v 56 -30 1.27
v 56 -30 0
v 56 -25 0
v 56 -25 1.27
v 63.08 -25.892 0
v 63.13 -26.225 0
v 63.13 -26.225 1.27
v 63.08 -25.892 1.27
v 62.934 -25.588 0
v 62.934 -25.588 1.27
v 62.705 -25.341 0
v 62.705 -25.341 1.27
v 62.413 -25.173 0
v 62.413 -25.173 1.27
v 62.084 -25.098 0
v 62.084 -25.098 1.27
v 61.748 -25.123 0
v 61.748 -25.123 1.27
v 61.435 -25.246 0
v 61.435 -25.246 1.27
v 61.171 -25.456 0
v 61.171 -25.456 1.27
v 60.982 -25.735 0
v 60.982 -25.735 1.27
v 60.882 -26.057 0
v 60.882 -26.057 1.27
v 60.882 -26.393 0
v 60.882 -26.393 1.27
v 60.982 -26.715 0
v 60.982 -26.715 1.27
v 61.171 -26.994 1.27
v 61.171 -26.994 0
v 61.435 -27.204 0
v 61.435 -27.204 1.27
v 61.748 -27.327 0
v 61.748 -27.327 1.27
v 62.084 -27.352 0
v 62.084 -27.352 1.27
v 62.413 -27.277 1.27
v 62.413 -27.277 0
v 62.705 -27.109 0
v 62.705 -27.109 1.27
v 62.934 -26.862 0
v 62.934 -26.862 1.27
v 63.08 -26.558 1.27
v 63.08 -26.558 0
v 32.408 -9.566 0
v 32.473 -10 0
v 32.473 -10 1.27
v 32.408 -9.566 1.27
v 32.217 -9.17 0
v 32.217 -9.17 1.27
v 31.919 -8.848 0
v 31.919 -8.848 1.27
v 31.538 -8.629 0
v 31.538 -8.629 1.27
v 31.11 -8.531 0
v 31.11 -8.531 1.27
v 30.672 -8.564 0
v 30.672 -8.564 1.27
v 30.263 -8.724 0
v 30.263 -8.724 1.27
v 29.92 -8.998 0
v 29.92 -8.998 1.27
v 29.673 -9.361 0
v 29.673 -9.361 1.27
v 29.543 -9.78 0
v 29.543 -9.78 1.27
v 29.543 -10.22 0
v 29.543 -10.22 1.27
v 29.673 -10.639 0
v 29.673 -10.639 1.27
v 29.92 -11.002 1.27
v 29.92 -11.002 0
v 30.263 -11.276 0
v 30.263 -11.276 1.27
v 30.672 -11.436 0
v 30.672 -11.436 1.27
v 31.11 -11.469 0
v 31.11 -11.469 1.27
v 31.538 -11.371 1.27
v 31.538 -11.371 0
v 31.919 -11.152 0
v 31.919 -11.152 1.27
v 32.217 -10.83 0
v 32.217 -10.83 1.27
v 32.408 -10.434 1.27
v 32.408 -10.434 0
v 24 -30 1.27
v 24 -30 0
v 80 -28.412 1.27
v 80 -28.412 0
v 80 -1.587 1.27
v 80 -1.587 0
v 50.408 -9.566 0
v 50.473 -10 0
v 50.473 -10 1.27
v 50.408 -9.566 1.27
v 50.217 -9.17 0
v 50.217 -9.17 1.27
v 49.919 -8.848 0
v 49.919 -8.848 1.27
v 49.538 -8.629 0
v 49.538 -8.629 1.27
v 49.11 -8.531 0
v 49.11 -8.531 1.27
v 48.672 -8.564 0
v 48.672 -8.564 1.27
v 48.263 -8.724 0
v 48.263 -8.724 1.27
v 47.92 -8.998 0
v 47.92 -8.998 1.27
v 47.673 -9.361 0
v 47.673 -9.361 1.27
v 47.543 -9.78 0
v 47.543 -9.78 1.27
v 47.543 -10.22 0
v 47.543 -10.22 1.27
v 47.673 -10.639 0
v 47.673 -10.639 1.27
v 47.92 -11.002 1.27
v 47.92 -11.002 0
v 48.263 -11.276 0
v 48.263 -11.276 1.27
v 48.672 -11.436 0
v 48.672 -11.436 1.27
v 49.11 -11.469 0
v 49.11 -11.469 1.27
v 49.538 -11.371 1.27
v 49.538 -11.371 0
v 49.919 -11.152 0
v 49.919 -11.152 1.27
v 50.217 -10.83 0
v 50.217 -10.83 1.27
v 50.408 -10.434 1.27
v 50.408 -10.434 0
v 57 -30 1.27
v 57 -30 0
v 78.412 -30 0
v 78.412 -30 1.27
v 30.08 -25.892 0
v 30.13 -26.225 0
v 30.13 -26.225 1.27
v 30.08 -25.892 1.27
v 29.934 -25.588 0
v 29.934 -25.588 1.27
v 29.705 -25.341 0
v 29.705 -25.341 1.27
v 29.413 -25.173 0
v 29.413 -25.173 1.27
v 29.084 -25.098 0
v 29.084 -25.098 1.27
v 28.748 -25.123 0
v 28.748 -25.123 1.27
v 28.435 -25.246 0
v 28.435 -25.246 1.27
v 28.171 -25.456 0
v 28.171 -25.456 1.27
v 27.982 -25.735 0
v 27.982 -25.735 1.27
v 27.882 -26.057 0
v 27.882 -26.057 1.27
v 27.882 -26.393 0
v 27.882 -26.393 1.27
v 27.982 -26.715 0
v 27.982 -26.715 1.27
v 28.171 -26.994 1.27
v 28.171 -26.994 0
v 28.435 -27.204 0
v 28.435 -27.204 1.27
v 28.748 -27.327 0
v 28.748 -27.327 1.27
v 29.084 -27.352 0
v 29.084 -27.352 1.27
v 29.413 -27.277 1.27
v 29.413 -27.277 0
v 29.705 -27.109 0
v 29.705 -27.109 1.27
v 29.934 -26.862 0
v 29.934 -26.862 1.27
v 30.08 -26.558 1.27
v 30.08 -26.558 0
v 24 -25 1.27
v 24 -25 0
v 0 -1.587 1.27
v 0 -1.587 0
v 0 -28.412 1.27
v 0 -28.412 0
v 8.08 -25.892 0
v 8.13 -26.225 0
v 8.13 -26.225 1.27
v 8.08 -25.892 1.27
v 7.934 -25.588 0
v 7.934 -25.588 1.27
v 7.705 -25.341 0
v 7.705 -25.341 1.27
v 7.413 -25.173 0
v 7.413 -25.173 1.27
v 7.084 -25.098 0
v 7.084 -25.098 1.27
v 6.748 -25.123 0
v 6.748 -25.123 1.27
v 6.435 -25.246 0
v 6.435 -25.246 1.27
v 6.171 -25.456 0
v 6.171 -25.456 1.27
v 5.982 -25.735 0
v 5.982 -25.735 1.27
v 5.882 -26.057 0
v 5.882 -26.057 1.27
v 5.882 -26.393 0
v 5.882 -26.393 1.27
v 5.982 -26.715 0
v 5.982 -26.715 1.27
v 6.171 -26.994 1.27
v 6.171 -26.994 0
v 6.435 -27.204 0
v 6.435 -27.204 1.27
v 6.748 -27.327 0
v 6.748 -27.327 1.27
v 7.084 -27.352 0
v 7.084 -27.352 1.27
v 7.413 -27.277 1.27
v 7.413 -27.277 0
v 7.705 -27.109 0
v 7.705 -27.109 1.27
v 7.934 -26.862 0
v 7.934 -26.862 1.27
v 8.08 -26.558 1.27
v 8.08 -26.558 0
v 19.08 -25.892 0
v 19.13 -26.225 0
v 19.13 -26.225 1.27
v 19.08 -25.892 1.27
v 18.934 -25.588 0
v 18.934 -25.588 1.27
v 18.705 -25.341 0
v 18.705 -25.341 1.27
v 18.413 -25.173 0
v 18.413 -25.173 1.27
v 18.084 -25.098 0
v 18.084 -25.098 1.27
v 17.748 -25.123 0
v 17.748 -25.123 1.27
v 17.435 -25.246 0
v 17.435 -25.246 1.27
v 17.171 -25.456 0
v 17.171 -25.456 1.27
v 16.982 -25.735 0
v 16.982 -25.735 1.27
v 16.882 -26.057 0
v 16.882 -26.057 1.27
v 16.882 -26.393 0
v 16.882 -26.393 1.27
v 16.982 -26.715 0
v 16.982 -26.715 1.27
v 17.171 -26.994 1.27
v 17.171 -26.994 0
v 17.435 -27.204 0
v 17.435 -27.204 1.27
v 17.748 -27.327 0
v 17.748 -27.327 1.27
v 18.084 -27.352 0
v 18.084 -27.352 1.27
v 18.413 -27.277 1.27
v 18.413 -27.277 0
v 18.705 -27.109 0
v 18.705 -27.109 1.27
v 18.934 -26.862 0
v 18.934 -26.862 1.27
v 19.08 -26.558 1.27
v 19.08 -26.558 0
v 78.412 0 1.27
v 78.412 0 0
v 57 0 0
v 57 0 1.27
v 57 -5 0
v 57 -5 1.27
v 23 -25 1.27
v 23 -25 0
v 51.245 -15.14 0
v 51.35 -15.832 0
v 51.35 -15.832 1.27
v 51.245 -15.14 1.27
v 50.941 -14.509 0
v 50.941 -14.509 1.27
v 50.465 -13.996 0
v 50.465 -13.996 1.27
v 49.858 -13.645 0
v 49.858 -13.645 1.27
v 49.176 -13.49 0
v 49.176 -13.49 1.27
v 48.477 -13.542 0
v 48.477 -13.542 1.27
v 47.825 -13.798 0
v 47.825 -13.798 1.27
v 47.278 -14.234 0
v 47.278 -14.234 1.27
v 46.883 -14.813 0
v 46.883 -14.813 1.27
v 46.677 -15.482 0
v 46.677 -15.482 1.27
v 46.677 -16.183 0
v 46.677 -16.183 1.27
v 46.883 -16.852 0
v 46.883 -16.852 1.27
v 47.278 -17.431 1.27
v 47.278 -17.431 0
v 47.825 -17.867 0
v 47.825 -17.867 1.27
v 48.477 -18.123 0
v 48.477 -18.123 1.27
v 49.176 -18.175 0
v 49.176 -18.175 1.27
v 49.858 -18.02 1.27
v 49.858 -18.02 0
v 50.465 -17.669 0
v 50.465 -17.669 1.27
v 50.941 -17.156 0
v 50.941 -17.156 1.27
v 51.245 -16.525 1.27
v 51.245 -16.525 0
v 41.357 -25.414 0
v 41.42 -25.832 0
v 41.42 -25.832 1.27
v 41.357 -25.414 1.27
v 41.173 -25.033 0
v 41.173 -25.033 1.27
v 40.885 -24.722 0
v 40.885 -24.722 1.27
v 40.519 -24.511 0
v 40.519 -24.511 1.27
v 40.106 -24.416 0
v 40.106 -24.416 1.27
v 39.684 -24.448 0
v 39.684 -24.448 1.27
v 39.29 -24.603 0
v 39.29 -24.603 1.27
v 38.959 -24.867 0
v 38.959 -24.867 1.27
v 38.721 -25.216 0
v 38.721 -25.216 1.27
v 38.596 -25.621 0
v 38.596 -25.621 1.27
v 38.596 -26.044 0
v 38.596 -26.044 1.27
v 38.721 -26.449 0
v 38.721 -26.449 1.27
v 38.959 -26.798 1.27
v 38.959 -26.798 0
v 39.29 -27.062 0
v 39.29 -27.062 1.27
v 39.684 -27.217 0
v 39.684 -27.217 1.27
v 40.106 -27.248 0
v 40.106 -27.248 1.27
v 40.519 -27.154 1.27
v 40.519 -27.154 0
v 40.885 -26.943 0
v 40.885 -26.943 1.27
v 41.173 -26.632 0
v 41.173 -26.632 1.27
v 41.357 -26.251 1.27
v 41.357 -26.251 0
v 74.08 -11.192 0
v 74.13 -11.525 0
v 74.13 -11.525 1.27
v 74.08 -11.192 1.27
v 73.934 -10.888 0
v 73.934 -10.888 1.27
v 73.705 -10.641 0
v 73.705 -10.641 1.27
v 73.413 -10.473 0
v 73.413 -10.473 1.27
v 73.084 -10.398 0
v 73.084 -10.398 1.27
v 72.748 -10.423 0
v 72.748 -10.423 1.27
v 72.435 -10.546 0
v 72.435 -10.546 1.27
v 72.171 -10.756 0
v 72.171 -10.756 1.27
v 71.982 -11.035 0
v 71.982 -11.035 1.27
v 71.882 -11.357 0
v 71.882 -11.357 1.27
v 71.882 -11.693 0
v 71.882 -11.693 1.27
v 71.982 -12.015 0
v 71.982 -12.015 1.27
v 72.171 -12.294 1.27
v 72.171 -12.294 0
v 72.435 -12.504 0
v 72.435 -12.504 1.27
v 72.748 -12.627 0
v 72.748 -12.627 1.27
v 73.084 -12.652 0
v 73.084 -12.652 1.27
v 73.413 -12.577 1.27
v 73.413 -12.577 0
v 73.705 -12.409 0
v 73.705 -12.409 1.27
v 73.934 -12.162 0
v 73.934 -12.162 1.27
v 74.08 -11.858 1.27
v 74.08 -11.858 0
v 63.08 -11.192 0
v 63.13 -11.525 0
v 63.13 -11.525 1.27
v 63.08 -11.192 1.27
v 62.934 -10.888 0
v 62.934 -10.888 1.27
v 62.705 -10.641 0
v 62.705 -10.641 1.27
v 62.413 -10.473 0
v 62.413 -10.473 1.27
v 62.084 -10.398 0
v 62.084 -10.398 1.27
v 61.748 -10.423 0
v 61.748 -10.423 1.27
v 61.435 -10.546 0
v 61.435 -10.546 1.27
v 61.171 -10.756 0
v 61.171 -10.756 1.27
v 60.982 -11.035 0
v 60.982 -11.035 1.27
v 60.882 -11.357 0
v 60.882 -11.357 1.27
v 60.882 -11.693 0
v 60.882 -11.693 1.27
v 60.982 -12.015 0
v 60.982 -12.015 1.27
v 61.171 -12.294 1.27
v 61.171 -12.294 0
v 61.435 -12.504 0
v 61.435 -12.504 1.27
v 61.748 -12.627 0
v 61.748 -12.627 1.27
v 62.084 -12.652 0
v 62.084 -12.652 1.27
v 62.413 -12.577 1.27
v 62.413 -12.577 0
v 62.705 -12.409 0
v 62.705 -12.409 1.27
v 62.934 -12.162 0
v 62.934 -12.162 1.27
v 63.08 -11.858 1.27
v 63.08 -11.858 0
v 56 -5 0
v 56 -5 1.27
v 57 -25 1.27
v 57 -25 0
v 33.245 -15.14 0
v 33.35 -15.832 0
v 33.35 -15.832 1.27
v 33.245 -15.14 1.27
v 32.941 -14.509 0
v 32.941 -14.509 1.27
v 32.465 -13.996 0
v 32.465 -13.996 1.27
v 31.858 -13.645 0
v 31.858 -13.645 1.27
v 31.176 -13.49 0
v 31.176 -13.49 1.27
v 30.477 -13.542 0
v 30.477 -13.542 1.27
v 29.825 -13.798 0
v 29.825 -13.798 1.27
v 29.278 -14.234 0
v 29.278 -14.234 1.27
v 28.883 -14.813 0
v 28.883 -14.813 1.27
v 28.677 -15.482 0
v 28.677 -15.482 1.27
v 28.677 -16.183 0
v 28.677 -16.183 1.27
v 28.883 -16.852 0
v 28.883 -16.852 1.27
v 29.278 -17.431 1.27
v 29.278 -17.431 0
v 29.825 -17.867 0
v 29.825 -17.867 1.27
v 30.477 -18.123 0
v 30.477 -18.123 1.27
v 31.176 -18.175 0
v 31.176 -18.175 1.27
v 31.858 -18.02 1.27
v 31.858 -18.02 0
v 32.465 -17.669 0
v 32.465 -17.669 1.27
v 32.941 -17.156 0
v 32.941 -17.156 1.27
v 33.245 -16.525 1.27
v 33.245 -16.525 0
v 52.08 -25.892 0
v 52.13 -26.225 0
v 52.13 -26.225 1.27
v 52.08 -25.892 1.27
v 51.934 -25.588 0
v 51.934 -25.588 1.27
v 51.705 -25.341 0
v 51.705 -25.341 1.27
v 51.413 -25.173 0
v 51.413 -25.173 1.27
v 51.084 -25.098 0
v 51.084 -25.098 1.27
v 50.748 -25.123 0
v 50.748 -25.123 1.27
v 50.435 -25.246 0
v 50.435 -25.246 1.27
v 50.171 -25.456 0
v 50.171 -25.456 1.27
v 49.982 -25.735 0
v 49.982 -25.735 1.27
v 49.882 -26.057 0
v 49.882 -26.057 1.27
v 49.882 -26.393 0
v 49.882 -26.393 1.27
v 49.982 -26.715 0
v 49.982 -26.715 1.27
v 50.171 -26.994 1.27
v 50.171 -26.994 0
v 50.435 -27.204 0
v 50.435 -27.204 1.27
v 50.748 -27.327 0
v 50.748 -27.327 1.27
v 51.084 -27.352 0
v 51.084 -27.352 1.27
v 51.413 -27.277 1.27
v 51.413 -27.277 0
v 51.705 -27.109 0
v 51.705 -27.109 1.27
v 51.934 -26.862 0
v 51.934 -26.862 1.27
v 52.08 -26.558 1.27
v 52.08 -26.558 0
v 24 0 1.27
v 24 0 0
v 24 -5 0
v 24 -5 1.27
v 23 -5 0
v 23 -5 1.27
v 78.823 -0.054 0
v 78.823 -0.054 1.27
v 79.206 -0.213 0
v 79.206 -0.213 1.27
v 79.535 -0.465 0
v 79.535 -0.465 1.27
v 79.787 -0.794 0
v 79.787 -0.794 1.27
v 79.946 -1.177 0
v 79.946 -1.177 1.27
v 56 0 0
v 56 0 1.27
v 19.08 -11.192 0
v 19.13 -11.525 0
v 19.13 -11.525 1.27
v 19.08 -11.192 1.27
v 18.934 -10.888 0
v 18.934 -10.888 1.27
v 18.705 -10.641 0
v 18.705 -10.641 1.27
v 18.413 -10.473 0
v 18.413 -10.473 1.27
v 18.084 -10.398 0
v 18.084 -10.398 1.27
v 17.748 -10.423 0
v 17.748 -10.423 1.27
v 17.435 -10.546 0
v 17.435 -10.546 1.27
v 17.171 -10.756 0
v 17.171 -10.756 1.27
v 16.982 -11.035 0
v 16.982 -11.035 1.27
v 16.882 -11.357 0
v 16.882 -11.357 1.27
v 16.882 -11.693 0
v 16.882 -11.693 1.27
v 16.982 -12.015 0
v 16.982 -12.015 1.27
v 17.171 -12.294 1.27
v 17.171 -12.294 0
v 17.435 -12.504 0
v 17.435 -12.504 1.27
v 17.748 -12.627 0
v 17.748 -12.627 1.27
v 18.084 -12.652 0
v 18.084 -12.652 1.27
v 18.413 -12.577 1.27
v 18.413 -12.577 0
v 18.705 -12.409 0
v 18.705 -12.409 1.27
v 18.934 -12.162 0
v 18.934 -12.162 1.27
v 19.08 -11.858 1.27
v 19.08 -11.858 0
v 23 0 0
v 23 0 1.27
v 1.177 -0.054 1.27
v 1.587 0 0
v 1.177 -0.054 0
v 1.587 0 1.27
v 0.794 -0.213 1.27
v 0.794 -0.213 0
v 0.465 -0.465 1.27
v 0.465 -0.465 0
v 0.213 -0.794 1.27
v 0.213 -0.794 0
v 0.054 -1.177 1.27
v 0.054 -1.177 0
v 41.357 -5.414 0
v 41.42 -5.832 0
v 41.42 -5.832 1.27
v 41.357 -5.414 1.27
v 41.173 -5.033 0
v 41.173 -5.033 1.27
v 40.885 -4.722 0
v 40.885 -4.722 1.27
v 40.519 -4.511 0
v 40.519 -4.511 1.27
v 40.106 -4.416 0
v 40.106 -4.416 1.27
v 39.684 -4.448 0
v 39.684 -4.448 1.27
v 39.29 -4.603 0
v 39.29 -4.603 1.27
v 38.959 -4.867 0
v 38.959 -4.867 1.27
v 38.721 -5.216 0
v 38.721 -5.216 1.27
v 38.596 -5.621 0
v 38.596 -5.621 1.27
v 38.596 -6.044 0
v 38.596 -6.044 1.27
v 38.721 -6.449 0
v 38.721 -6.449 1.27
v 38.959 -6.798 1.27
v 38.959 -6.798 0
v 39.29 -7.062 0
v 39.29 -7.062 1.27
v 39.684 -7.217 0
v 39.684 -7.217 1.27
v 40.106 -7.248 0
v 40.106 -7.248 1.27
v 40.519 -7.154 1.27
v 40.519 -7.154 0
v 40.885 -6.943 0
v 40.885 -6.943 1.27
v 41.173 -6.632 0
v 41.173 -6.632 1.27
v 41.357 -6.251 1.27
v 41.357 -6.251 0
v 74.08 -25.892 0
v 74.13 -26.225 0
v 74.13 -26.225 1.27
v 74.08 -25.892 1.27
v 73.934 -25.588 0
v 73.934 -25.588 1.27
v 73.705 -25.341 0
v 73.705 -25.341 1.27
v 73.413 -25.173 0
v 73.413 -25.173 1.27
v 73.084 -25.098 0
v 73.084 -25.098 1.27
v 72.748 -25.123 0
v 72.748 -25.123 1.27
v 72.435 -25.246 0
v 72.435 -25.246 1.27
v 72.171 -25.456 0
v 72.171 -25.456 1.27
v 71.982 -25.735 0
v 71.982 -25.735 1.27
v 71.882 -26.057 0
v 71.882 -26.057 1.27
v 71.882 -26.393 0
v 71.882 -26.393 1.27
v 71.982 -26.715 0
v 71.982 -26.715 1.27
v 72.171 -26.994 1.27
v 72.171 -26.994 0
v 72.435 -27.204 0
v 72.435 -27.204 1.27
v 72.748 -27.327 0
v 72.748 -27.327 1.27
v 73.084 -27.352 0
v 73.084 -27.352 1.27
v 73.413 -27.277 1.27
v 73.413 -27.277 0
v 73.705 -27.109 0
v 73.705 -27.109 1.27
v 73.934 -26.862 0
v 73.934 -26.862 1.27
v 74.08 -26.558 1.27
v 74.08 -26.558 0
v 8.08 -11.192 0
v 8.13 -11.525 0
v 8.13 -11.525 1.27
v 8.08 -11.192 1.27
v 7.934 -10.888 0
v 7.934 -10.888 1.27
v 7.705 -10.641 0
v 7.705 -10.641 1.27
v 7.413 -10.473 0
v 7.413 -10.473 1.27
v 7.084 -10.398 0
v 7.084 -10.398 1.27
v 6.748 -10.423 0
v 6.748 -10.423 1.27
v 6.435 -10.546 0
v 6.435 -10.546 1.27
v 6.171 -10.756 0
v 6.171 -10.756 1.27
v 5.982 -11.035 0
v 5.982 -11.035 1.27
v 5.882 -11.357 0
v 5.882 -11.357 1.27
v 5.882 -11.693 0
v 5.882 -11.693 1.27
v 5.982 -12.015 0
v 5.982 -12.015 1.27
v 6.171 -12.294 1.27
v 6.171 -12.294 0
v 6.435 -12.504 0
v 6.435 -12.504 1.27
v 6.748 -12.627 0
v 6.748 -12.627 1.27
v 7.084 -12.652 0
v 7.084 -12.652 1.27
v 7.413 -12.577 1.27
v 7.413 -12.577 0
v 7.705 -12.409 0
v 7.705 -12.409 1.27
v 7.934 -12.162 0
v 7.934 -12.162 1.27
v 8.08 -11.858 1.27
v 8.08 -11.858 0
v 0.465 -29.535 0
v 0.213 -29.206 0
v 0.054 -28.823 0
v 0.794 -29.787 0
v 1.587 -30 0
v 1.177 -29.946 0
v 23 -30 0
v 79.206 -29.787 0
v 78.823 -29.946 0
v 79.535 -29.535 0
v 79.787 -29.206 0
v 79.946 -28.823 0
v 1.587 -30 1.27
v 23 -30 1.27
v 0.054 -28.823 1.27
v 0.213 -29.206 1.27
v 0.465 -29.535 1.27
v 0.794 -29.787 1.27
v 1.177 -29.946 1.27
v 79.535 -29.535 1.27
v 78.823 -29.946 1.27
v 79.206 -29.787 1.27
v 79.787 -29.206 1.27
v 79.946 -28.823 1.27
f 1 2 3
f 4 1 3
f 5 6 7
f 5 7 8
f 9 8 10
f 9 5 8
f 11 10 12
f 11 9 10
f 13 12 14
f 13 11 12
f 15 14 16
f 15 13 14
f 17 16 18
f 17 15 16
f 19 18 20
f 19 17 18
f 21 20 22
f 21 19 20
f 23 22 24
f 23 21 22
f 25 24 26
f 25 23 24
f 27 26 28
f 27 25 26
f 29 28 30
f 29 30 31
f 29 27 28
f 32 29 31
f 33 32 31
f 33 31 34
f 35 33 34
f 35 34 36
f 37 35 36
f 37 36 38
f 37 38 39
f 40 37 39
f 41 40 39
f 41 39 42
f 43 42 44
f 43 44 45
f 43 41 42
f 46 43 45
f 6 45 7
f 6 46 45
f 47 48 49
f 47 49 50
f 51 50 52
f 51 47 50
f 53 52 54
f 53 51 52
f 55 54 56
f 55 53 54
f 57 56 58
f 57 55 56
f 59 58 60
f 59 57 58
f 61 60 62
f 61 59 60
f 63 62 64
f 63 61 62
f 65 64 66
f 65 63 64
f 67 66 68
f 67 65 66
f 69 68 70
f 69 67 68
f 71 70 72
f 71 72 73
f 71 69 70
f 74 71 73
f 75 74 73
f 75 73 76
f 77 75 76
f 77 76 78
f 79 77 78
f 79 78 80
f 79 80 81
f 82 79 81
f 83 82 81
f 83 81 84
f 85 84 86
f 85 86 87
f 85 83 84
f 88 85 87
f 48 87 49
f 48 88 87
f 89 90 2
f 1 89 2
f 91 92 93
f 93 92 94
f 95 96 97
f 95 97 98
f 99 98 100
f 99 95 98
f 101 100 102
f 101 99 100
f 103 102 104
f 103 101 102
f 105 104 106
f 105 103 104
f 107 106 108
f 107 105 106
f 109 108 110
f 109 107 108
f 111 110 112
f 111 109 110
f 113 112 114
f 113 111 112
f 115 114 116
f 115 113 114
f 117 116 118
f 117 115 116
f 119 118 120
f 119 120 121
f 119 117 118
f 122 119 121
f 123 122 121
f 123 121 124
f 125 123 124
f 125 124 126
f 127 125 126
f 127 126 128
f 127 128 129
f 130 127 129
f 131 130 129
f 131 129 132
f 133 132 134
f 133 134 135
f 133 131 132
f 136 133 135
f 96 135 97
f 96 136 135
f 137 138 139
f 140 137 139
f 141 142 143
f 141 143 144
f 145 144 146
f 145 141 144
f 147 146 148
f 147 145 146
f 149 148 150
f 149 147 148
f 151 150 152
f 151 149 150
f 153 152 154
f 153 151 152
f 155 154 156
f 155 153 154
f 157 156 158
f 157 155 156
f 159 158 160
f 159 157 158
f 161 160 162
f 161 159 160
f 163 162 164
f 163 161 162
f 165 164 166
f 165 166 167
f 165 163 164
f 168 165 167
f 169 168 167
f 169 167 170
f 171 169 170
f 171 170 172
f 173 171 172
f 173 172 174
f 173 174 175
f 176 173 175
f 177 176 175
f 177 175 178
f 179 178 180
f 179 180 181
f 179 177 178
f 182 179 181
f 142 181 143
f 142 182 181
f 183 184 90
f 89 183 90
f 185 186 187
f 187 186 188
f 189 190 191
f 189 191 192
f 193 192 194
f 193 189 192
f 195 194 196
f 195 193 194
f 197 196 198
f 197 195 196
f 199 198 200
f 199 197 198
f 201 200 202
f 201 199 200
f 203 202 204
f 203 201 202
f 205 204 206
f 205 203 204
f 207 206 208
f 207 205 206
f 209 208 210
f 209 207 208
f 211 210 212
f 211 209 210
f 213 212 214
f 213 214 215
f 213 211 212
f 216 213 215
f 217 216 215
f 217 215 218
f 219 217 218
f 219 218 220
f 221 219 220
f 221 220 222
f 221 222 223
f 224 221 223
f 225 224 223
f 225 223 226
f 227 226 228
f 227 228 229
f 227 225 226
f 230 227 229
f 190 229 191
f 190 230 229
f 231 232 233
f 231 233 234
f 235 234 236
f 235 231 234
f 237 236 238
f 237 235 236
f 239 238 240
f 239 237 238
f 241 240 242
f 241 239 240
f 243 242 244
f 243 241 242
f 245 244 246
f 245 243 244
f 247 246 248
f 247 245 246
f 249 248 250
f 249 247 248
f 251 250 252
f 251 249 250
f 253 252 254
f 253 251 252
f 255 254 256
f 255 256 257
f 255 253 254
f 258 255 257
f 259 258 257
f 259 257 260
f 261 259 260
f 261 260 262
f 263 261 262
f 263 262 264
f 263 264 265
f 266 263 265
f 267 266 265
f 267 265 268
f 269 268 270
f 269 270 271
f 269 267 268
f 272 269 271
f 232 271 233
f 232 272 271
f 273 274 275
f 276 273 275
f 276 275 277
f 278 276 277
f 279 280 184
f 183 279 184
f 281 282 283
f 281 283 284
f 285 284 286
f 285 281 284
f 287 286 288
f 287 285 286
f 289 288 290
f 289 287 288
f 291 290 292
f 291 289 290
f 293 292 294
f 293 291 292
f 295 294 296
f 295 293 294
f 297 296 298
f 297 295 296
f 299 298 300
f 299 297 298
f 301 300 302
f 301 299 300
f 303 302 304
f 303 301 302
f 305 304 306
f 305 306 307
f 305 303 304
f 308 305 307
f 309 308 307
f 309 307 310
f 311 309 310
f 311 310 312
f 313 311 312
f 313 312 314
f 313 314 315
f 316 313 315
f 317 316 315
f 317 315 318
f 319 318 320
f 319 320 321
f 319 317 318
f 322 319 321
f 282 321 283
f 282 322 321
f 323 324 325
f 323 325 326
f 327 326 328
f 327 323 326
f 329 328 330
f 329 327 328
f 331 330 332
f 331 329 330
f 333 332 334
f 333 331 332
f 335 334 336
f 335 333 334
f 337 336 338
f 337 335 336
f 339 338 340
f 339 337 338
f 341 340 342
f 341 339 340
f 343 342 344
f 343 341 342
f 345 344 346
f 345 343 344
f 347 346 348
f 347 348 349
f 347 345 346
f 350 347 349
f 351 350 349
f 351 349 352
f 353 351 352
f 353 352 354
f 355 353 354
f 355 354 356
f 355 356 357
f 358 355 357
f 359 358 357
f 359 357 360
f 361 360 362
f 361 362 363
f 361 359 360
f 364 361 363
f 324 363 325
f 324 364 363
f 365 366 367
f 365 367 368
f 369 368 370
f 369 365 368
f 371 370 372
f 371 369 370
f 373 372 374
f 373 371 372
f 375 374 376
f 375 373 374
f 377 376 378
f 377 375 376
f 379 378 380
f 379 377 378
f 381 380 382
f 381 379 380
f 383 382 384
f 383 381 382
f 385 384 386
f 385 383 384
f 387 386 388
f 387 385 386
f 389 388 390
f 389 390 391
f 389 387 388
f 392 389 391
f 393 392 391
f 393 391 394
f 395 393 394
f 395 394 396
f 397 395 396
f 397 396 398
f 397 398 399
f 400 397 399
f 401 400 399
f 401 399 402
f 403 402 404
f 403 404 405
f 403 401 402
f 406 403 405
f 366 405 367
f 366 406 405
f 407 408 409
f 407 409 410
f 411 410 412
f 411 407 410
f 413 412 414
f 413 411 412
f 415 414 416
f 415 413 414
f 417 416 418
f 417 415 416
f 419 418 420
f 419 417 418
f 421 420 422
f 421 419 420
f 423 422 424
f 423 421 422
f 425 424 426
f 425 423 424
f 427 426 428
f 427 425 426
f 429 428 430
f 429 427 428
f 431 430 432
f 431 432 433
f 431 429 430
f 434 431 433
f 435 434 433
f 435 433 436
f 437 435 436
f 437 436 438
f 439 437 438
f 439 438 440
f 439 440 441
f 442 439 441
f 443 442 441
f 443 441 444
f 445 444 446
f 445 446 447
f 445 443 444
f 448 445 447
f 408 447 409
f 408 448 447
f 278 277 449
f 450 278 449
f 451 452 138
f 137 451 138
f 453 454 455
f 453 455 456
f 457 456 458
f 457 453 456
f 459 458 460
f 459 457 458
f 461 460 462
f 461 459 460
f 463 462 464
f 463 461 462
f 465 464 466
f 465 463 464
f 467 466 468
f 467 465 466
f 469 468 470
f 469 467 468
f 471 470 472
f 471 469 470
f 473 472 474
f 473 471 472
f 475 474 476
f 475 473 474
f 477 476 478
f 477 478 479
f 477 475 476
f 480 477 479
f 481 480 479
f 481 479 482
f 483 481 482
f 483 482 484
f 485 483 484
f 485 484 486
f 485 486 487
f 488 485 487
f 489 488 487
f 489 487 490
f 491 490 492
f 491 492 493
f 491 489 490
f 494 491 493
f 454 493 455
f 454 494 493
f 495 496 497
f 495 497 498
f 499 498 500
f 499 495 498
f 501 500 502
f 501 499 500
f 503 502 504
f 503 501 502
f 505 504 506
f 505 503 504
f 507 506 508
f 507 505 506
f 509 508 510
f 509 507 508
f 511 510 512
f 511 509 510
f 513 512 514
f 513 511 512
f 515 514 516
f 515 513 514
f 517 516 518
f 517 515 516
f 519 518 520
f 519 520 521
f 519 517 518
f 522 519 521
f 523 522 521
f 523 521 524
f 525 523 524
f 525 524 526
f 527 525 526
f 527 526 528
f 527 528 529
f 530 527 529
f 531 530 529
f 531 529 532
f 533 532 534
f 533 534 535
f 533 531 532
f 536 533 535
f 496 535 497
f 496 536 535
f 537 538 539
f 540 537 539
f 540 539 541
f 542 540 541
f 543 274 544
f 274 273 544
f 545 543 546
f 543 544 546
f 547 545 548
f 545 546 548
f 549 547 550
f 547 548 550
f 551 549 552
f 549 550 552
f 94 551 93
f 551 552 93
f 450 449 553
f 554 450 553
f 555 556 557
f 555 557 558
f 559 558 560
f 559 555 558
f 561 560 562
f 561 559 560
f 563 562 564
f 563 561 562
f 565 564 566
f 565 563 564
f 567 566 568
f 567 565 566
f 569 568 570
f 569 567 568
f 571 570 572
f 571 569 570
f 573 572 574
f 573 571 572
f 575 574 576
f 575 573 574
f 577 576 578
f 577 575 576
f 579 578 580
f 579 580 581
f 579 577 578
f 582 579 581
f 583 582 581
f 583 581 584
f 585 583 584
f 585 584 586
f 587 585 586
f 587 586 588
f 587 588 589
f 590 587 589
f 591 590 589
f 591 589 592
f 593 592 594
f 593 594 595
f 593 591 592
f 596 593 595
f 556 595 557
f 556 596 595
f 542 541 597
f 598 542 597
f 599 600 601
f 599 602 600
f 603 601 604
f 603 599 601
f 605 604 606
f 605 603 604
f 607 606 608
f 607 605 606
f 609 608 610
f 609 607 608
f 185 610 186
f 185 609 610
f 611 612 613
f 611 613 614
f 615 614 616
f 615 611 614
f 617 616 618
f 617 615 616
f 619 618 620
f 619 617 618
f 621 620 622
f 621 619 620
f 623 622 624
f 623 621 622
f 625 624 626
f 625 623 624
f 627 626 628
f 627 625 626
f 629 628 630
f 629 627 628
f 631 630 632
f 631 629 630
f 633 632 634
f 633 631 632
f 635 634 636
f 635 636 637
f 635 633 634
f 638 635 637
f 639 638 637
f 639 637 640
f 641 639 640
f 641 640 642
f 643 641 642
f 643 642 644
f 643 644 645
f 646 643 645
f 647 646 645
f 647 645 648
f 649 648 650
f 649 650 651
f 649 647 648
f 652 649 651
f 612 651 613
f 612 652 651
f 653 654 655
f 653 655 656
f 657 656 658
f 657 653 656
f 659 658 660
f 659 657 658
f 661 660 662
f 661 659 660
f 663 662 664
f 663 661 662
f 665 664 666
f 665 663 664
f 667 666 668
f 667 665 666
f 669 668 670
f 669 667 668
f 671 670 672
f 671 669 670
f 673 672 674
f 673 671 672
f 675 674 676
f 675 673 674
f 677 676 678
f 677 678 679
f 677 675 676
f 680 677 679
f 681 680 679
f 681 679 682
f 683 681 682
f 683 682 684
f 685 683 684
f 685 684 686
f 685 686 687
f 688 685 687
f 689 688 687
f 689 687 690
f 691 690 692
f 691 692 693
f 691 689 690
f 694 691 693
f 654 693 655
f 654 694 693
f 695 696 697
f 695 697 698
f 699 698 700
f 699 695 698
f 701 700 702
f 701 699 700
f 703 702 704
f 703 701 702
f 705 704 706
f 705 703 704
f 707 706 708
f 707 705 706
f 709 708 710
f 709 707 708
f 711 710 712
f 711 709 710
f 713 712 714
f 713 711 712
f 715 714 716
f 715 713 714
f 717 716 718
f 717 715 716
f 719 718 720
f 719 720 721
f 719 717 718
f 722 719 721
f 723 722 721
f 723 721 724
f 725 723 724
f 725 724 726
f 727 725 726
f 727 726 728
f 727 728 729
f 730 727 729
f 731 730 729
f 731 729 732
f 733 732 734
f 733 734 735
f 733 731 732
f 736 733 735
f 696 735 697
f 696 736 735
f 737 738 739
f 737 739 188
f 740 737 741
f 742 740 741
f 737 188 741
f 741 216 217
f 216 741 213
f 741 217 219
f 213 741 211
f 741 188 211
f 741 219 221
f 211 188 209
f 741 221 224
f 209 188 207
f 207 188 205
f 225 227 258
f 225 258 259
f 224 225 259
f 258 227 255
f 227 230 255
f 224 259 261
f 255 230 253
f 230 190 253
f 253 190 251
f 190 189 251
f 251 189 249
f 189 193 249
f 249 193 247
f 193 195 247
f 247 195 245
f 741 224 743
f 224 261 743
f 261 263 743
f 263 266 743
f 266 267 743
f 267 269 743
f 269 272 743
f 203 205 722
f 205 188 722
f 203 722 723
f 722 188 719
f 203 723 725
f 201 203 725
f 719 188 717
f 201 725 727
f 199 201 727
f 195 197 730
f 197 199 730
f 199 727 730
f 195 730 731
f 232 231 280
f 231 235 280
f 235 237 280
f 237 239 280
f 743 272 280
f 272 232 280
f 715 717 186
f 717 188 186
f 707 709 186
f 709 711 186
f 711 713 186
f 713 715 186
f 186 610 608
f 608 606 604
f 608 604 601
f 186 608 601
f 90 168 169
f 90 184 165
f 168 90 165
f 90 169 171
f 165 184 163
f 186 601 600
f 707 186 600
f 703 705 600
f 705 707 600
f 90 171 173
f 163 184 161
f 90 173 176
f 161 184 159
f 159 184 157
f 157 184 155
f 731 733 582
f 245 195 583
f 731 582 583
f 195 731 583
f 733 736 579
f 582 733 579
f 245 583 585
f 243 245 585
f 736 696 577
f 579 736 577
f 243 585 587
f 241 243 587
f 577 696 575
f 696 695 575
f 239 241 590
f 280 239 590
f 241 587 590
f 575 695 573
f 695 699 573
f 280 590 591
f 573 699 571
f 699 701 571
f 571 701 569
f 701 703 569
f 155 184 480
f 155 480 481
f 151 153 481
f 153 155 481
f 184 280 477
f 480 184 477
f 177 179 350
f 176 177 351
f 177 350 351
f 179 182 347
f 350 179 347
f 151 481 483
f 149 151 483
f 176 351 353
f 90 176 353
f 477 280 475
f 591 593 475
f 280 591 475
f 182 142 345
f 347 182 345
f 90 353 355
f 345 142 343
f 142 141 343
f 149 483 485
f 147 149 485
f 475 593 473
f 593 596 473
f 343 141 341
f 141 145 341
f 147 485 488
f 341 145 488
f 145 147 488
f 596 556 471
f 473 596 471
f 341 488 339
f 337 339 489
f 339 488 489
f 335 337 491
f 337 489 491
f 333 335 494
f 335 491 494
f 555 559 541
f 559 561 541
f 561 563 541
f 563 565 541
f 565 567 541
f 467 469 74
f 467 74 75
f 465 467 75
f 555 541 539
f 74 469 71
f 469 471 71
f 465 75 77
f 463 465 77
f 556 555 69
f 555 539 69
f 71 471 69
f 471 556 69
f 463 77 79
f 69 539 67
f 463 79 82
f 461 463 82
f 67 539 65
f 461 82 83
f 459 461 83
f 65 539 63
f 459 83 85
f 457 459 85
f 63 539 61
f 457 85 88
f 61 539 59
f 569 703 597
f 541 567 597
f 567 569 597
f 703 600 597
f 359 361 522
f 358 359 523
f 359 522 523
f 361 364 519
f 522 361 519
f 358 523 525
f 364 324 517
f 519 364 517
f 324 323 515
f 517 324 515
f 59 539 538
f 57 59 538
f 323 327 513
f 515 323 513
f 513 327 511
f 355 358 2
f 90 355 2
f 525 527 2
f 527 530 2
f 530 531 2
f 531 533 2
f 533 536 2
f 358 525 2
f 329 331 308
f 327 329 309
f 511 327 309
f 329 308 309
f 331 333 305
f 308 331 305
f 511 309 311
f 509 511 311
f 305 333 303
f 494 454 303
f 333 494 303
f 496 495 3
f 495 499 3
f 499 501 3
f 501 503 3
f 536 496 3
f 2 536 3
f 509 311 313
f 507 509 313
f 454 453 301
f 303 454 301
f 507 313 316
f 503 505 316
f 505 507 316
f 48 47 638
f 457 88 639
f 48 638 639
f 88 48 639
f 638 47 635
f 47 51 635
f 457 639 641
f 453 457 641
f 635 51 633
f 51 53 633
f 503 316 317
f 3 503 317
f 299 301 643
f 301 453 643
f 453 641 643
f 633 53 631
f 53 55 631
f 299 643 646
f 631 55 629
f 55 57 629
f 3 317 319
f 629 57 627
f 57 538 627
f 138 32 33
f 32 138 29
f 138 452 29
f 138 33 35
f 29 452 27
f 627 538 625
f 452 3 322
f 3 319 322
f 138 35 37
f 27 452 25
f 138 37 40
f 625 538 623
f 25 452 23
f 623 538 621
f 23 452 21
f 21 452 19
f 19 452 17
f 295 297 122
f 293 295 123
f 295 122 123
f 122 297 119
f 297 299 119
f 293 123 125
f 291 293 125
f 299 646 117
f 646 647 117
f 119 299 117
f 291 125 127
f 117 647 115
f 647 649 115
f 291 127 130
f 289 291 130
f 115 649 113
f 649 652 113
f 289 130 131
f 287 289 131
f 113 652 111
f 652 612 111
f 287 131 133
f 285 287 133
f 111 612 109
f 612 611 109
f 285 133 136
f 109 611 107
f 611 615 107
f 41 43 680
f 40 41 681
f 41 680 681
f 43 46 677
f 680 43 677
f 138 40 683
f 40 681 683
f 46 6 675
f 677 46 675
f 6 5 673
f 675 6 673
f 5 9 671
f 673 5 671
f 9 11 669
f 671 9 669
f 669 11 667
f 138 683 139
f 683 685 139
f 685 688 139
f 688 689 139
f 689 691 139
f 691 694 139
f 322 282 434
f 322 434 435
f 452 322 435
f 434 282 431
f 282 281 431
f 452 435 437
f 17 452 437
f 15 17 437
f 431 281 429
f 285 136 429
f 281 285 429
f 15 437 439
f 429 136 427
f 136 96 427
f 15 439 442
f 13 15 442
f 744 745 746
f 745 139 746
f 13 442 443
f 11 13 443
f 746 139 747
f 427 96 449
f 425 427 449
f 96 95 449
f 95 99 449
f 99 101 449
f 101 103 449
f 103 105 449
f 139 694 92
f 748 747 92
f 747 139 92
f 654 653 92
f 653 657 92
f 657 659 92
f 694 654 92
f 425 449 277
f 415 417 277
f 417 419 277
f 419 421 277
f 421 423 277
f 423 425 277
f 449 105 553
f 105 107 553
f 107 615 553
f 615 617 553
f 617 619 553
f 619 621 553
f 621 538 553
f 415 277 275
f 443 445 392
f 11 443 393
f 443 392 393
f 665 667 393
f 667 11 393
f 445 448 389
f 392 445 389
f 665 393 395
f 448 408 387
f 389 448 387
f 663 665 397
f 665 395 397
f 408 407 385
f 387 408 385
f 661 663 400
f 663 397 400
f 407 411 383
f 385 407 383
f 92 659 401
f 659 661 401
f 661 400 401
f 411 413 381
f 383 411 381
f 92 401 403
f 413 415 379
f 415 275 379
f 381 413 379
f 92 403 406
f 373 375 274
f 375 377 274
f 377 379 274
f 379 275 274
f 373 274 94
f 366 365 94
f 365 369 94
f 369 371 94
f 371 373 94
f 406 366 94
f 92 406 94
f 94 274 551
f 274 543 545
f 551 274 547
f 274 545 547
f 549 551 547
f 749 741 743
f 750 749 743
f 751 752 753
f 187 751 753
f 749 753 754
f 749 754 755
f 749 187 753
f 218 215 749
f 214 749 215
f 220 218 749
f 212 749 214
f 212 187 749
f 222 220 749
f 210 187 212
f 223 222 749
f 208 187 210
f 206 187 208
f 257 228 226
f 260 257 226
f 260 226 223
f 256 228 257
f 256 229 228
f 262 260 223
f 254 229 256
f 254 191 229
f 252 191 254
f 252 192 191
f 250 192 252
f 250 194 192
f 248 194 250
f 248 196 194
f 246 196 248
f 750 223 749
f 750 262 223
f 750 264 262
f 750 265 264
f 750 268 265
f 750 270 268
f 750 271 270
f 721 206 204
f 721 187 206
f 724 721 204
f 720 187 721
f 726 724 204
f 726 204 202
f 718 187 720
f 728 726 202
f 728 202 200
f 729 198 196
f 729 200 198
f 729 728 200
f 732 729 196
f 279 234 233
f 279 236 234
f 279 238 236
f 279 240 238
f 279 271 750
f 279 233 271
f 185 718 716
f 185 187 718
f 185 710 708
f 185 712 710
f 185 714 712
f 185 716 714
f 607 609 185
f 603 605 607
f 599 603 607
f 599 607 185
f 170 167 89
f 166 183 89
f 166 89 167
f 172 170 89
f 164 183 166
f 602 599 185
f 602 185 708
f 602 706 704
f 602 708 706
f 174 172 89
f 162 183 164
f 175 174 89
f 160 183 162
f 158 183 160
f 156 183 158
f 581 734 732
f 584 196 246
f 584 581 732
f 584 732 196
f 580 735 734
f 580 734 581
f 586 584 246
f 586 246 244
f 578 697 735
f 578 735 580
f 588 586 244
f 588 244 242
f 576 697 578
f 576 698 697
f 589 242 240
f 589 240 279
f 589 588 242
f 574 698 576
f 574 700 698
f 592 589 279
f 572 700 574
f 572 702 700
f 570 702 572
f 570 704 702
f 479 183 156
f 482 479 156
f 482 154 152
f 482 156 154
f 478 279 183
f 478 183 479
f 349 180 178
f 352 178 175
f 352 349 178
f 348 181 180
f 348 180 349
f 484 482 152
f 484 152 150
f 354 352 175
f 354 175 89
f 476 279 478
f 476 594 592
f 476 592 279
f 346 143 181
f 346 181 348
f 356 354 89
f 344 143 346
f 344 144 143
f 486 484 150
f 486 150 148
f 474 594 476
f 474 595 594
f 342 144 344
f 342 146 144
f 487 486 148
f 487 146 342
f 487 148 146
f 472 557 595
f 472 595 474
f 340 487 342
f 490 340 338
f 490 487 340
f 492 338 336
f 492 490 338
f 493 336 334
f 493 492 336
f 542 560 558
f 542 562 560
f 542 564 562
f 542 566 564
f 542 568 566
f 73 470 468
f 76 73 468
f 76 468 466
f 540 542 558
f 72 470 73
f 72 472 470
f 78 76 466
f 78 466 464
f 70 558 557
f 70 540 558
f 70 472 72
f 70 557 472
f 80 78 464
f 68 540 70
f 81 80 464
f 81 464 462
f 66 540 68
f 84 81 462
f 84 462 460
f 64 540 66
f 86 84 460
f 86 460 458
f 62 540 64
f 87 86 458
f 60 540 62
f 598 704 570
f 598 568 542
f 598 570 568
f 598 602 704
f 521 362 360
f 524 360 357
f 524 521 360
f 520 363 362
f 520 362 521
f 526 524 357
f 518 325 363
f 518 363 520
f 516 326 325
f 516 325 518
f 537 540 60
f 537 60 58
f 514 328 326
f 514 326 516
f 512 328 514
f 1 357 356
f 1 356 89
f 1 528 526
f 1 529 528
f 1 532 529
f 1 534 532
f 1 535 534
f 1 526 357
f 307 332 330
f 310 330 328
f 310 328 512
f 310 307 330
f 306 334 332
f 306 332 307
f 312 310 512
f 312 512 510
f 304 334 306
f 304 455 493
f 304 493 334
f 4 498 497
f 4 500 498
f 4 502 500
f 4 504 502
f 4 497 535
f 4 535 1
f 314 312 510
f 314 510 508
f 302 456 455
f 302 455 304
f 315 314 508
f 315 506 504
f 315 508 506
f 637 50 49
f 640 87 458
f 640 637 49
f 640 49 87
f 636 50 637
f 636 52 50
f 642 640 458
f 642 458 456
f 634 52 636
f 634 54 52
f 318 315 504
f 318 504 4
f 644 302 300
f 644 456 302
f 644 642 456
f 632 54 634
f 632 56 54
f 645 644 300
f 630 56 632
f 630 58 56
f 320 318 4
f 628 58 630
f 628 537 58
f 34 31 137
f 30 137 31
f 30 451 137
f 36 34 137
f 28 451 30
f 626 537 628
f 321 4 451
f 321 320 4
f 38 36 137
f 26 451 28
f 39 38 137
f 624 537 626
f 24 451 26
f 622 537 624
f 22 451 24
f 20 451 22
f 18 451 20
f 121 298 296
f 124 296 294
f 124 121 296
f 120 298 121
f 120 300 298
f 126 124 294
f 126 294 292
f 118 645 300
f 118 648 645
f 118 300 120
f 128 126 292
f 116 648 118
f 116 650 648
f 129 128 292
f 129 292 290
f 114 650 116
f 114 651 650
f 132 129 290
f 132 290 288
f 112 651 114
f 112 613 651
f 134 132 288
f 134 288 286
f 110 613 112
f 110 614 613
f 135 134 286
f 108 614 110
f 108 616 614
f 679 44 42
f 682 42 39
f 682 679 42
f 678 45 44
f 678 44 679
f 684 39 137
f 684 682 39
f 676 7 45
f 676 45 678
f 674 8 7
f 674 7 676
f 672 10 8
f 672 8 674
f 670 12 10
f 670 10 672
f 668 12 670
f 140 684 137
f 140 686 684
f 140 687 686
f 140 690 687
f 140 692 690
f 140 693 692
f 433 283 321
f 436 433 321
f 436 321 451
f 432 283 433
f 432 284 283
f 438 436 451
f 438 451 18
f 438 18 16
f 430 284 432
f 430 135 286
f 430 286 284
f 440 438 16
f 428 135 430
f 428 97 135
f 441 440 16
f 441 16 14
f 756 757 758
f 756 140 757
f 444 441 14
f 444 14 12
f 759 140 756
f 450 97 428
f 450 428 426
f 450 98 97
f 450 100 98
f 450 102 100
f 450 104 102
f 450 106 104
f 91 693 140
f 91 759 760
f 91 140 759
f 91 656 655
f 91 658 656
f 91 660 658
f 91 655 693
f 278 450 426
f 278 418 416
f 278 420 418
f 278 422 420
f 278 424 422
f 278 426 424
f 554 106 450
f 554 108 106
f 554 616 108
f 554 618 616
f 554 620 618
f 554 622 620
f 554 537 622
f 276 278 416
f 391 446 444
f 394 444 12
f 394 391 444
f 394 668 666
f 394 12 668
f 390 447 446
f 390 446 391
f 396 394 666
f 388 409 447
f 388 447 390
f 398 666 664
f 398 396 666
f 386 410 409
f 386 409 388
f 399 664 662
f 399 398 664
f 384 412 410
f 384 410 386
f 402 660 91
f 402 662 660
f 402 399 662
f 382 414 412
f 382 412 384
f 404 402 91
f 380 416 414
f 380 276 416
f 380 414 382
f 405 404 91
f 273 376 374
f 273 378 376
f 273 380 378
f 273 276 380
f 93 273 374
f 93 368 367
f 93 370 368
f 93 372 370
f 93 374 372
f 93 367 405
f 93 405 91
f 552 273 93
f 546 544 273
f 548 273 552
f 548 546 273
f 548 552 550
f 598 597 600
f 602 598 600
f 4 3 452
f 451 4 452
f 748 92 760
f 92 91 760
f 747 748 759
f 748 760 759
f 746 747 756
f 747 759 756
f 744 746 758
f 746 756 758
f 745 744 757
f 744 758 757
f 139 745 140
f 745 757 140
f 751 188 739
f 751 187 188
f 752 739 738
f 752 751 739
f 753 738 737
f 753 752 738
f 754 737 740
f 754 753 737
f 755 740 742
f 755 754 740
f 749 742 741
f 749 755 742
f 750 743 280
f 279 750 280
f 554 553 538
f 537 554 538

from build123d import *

# Parameters (mm, degrees)
SKETCH1_R           = 1.1303
SKETCH1_R_2         = 2.3495
SKETCH1_R_3         = 1.4732
SKETCH1_R_4         = 1.42
BOSS_EXTRUDE1_DEPTH = 1.27
FILLET1_R           = 1.5875


with BuildPart() as part:
    # Sketch1 → Boss-Extrude1 (new body)
    with BuildSketch(Plane.XY):
        Polygon((23, 0), (0, 0), (0, -30), (23, -30), (23, -25), (24, -25), (24, -30), (56, -30), (56, -25), (57, -25), (57, -30), (80, -30), (80, 0), (57, 0), (57, -5), (56, -5), (56, 0), (24, 0), (24, -5), (23, -5), align=None)
        with Locations((7, -26.225)):
            Circle(SKETCH1_R, mode=Mode.SUBTRACT)
        with Locations((18, -26.225)):
            Circle(SKETCH1_R, mode=Mode.SUBTRACT)
        with Locations((29, -26.225)):
            Circle(SKETCH1_R, mode=Mode.SUBTRACT)
        with Locations((31, -15.832468656)):
            Circle(SKETCH1_R_2, mode=Mode.SUBTRACT)
        with Locations((51, -26.225)):
            Circle(SKETCH1_R, mode=Mode.SUBTRACT)
        with Locations((62, -26.225)):
            Circle(SKETCH1_R, mode=Mode.SUBTRACT)
        with Locations((73, -26.225)):
            Circle(SKETCH1_R, mode=Mode.SUBTRACT)
        with Locations((49, -15.832468656)):
            Circle(SKETCH1_R_2, mode=Mode.SUBTRACT)
        with Locations((7, -11.525)):
            Circle(SKETCH1_R, mode=Mode.SUBTRACT)
        with Locations((18, -11.525)):
            Circle(SKETCH1_R, mode=Mode.SUBTRACT)
        with Locations((31, -10)):
            Circle(SKETCH1_R_3, mode=Mode.SUBTRACT)
        with Locations((49, -10)):
            Circle(SKETCH1_R_3, mode=Mode.SUBTRACT)
        with Locations((62, -11.525)):
            Circle(SKETCH1_R, mode=Mode.SUBTRACT)
        with Locations((73, -11.525)):
            Circle(SKETCH1_R, mode=Mode.SUBTRACT)
        with Locations((40, -5.832468656)):
            Circle(SKETCH1_R_4, mode=Mode.SUBTRACT)
        with Locations((40, -25.832468656)):
            Circle(SKETCH1_R_4, mode=Mode.SUBTRACT)
    extrude(amount=BOSS_EXTRUDE1_DEPTH)

    # Fillet1
    fillet1_edges = [part.edges().sort_by_distance(p)[0] for p in [
        (0, -30, 0.635),
        (0, 0, 0.635),
        (80, 0, 0.635),
        (80, -30, 0.635),
    ]]
    fillet(fillet1_edges, radius=FILLET1_R)


solid = part.part
